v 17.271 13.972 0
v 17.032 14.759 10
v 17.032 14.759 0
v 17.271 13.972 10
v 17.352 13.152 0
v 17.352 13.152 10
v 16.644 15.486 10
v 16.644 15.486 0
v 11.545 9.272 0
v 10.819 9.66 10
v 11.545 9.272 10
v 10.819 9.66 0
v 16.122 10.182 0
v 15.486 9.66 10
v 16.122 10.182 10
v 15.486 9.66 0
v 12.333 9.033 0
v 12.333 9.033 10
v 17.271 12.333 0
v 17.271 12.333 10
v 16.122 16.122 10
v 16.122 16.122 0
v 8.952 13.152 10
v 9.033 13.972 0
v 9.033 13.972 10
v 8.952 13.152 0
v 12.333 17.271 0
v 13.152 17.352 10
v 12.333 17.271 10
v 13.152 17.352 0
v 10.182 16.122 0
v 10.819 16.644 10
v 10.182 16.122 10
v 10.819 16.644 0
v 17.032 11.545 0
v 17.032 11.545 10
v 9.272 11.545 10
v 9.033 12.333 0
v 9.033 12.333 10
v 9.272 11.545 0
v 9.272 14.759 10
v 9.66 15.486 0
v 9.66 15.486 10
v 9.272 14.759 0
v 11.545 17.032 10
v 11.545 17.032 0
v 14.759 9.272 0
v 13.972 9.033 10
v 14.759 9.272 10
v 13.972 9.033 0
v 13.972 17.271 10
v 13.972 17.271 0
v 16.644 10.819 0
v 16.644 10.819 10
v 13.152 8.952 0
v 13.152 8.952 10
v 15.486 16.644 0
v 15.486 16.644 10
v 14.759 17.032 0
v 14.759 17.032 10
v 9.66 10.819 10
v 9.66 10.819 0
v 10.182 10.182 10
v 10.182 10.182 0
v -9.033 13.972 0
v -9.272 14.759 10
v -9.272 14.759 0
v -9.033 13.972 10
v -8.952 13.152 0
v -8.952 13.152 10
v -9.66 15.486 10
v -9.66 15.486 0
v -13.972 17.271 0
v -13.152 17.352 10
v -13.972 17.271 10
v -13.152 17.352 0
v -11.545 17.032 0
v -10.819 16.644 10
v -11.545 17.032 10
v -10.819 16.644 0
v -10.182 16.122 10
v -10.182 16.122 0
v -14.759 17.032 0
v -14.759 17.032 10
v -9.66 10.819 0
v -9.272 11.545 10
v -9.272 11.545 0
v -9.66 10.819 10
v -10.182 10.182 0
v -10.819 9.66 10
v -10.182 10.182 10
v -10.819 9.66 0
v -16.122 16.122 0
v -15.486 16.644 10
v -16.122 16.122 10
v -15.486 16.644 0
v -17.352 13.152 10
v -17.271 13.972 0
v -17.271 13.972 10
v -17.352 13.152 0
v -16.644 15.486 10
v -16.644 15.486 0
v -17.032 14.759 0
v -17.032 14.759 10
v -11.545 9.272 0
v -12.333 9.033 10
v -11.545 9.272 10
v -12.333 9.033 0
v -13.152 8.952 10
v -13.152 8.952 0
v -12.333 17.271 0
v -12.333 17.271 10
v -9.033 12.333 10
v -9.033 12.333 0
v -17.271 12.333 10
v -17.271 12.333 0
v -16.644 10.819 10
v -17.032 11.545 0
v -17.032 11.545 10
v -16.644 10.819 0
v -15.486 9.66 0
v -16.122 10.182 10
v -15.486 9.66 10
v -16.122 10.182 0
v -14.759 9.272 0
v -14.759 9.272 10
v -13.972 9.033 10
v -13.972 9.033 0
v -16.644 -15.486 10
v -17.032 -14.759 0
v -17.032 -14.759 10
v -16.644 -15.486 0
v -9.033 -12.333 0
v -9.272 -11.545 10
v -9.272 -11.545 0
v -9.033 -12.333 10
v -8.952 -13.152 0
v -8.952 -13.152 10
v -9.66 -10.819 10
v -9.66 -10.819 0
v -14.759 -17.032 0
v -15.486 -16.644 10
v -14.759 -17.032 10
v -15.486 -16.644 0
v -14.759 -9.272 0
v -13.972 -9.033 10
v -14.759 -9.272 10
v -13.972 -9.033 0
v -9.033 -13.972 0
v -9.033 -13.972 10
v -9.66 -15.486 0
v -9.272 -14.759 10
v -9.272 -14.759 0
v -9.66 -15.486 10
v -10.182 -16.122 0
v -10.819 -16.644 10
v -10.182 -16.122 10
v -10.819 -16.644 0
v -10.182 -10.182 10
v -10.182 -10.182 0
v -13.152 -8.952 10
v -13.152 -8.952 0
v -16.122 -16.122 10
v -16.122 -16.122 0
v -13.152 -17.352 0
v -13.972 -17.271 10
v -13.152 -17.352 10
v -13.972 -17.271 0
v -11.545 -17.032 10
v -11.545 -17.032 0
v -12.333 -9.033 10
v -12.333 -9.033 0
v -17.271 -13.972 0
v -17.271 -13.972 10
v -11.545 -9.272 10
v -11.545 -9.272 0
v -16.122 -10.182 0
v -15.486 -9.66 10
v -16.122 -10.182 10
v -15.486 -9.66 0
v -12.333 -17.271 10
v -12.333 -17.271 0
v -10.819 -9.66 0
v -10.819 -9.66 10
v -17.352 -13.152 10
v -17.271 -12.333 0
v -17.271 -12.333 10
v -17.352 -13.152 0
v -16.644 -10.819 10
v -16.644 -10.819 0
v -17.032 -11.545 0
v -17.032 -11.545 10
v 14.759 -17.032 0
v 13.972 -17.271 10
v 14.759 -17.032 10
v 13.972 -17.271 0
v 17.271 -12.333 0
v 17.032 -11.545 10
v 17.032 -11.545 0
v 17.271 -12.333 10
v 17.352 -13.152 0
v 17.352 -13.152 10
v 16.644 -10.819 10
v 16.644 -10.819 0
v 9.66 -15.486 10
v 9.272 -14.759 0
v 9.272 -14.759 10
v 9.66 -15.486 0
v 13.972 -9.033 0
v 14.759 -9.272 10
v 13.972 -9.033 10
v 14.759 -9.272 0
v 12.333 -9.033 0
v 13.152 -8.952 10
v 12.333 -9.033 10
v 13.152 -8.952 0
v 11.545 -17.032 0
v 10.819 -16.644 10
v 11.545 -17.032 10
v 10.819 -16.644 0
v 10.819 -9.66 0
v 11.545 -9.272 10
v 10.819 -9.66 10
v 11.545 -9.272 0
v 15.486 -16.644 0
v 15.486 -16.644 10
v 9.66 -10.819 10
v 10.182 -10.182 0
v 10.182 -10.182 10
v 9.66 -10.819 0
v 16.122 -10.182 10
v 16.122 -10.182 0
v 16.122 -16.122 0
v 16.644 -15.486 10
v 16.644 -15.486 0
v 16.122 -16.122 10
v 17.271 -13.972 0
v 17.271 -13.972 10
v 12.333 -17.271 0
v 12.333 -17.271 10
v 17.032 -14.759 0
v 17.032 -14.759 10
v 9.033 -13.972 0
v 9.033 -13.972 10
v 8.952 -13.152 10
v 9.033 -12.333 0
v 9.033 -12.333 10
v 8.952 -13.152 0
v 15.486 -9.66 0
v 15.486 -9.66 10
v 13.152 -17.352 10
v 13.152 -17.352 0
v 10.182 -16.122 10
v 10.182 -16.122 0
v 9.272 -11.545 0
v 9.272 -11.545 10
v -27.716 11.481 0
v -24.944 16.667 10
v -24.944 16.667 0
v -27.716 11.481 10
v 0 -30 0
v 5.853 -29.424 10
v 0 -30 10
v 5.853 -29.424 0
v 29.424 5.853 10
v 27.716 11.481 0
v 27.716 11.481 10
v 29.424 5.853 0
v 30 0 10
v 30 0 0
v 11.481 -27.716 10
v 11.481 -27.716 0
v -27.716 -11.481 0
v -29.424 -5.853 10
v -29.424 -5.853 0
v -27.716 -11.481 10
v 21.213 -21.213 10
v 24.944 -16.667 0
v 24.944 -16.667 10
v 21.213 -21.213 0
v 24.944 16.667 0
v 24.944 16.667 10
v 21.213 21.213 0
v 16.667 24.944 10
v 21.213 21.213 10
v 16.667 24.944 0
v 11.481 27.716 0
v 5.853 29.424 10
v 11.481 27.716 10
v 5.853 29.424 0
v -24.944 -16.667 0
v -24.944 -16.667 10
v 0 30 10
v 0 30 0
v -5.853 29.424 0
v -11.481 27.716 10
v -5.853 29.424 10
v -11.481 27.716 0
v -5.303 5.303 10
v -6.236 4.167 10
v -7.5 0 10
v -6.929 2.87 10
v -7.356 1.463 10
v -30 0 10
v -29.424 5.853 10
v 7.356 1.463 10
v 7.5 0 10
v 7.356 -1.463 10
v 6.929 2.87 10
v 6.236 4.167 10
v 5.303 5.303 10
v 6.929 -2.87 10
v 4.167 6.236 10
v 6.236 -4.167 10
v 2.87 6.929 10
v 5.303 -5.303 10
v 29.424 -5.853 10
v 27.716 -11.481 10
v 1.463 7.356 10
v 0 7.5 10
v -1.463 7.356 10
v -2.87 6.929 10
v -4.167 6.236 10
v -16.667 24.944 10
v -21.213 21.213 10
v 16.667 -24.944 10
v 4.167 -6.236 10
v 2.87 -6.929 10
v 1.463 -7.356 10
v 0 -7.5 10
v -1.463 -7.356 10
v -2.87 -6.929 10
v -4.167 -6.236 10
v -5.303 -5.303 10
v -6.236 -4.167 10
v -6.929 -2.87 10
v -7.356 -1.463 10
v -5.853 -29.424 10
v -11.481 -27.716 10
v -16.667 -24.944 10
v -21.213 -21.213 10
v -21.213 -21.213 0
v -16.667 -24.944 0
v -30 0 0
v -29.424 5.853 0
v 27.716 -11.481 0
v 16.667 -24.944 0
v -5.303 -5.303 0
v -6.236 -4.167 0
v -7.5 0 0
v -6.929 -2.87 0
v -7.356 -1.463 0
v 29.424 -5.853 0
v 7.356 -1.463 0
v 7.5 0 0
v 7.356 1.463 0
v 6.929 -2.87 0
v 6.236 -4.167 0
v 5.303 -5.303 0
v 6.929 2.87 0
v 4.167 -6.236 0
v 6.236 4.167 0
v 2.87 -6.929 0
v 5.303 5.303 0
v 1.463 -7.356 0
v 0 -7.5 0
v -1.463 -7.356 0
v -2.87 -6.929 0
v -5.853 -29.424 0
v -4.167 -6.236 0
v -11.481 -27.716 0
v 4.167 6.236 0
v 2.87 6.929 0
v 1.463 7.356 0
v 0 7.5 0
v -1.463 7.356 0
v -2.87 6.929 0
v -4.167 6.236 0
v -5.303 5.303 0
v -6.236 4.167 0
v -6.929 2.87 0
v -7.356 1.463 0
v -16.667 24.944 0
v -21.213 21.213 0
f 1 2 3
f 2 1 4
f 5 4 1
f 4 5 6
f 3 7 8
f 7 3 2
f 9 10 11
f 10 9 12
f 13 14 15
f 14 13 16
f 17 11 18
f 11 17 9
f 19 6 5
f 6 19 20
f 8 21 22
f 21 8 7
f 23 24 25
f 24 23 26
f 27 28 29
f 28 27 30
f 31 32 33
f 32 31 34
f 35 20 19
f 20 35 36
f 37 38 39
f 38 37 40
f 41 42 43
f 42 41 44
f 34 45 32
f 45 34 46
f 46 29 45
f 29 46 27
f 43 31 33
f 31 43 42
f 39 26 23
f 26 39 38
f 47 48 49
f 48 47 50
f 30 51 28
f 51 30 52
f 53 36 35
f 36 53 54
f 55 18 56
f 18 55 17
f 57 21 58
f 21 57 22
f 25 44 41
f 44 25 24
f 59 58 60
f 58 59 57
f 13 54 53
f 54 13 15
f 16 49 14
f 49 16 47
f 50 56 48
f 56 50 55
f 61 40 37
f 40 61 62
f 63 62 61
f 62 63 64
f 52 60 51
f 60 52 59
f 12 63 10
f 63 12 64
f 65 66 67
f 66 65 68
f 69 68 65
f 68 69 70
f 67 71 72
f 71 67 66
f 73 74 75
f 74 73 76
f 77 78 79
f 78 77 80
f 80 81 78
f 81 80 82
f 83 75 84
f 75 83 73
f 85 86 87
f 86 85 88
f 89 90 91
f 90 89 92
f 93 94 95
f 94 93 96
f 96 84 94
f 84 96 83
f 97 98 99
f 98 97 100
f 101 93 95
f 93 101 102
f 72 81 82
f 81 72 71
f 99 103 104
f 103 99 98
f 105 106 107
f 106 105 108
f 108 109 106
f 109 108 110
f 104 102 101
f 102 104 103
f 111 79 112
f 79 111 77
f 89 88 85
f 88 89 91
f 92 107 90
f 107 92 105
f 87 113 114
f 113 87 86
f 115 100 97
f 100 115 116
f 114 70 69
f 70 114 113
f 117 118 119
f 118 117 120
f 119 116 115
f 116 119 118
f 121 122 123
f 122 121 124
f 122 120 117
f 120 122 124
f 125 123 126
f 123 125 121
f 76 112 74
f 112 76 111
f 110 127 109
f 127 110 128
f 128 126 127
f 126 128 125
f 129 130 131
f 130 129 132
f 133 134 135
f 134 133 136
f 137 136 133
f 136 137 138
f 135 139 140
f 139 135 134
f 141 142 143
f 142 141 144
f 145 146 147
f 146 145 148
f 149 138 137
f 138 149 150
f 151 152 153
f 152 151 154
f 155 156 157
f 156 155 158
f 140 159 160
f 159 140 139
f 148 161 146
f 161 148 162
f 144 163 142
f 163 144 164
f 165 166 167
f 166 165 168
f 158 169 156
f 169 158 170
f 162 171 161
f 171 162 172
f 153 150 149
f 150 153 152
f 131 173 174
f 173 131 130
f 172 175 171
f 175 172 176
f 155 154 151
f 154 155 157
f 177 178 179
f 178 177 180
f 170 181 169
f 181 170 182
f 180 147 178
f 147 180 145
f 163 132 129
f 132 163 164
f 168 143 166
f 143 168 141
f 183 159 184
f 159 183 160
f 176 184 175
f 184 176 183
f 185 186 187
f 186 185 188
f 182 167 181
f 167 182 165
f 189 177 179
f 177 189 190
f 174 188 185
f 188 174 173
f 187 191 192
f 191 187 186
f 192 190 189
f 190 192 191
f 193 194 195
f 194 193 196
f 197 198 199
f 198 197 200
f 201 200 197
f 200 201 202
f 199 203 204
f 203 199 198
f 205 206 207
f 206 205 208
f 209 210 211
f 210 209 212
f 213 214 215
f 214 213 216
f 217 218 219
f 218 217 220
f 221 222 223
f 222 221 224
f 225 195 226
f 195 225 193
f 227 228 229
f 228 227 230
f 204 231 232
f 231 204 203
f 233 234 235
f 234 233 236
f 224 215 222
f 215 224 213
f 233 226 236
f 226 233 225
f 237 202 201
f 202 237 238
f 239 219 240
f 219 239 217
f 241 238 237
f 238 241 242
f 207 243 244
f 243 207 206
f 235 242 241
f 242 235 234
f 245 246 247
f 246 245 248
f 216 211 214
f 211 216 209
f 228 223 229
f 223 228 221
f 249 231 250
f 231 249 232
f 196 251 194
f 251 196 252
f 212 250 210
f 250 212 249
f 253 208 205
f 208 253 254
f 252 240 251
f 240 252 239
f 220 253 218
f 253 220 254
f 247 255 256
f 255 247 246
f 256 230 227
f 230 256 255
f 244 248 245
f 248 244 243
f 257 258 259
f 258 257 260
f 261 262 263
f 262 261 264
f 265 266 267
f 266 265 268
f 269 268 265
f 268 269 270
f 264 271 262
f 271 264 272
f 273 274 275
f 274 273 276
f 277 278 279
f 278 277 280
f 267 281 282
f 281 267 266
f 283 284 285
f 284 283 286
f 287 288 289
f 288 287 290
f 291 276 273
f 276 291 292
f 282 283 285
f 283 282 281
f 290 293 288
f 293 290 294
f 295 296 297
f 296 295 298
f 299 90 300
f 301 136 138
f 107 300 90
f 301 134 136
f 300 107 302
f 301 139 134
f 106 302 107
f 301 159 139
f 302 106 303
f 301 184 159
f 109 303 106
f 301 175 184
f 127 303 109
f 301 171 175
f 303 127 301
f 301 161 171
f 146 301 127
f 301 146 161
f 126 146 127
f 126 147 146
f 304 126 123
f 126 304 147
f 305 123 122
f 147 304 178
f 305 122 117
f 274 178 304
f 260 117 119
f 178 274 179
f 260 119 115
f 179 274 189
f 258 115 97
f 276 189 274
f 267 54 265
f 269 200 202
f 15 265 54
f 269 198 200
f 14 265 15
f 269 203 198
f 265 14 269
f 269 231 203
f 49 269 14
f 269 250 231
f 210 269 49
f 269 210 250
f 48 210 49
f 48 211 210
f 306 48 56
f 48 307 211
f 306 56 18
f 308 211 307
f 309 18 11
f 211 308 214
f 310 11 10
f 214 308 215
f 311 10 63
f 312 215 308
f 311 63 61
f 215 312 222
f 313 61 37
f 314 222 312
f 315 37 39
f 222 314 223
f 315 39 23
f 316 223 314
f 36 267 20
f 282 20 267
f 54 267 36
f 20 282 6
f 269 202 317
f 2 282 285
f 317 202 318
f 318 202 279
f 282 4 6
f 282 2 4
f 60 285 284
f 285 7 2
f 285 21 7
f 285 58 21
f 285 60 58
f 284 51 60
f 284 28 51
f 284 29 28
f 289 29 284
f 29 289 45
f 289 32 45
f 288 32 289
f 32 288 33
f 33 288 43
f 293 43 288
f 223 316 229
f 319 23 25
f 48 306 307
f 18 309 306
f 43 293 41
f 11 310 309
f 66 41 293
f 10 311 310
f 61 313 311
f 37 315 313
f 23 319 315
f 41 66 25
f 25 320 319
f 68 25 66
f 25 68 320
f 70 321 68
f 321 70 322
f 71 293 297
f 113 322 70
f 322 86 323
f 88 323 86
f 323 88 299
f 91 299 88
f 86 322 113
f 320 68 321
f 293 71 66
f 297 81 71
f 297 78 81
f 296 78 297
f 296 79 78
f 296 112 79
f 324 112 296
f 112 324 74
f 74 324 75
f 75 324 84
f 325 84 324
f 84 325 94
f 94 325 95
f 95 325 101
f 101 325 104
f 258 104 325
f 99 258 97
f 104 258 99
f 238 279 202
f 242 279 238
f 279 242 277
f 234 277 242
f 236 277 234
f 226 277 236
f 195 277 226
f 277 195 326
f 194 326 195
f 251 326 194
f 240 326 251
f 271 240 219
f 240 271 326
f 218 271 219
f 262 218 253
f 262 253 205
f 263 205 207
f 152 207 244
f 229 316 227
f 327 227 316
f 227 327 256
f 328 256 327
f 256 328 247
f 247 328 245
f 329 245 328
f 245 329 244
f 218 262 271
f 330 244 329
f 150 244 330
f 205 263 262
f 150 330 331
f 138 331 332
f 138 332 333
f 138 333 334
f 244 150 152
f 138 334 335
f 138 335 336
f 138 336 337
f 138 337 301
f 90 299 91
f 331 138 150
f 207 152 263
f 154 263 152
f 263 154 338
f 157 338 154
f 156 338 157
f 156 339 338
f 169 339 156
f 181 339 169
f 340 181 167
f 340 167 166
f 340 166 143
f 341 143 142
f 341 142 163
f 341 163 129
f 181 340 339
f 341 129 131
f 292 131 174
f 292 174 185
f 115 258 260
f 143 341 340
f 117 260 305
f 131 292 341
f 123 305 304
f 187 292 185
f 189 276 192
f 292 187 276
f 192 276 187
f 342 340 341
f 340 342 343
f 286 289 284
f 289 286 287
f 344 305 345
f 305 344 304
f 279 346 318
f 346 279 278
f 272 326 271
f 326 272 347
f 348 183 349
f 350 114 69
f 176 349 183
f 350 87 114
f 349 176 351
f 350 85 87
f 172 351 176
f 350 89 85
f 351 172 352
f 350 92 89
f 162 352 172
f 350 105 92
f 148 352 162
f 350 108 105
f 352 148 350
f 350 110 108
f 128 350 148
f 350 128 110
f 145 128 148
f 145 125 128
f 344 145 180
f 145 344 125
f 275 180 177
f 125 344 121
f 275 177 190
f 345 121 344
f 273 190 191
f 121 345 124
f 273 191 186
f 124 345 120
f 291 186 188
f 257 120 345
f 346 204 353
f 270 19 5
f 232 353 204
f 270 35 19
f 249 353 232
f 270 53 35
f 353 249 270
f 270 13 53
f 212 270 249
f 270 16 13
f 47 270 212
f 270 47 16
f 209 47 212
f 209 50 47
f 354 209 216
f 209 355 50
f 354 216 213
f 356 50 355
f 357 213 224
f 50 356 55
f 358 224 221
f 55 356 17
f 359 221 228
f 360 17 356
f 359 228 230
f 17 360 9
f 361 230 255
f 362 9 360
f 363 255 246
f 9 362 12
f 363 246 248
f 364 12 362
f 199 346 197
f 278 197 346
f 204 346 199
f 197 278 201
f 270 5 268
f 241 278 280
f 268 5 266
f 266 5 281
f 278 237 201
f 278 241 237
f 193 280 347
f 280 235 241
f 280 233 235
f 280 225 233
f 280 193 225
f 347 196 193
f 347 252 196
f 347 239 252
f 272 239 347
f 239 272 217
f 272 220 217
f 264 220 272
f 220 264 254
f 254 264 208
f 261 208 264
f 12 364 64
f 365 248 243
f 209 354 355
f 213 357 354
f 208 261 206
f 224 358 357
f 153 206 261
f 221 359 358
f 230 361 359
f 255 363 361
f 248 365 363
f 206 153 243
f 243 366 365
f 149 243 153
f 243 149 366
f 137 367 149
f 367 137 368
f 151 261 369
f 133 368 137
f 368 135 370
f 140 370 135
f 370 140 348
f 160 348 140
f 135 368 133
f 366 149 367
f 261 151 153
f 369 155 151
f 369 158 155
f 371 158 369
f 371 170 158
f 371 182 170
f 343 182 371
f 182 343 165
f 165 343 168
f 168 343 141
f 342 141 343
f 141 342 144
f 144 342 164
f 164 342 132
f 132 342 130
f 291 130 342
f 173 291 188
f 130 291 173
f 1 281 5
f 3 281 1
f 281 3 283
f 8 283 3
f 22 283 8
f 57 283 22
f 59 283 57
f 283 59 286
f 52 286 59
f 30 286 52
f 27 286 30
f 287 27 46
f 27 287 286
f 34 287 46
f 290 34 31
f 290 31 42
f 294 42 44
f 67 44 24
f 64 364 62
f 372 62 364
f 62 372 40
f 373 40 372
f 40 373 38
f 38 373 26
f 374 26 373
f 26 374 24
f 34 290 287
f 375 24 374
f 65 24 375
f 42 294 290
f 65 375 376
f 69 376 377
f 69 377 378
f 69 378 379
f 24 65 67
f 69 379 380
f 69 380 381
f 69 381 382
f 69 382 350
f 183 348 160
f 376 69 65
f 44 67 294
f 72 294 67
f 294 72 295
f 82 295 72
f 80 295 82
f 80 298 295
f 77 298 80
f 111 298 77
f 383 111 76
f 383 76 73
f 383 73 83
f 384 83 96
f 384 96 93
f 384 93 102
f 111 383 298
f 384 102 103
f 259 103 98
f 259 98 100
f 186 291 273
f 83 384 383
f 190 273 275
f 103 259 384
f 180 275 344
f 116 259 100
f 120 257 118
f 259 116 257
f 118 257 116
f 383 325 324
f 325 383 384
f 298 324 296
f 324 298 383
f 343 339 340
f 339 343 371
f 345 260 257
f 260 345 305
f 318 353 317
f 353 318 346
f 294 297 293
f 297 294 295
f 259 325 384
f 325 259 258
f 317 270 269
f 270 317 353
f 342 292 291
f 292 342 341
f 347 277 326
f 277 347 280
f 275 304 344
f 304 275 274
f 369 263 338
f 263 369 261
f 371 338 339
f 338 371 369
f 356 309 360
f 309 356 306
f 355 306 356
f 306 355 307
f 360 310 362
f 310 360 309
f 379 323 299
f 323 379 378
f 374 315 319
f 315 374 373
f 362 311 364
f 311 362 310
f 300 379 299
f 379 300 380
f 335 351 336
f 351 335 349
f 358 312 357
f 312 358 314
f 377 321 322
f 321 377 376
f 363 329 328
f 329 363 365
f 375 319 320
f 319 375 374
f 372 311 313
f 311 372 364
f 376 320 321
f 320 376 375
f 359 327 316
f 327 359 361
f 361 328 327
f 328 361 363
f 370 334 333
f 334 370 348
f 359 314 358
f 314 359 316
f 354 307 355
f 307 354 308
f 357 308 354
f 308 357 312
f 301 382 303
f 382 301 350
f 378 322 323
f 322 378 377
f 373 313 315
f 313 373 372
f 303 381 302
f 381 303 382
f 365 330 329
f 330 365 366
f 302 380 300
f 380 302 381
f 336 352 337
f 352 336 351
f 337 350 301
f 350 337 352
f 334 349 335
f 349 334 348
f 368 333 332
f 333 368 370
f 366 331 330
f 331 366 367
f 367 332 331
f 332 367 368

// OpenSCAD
$fn = 32;

// ----------------------------------------------------------------------
// Flange Ø60 x 10
// 4 holes on a Ø37.2 bolt circle, bolted joints
// ----------------------------------------------------------------------

// --- parameters (mm) ---
flange_d = 60;   // outside diameter of the flange
thickness = 10;  // flange thickness
holes = 4;       // number of bolt holes
pcd = 37.2;      // bolt circle diameter
start_deg = 45;  // angle of the first hole, from +X
hole_d = 8.4;    // bolt hole diameter
bore_d = 15;     // central through bore
hub_d = 27;      // hub outside diameter
hub_h = 0;       // hub height above the flange face (0 = no hub)

// --- derived feature positions (mm) ---
height = thickness + hub_h;  // = 10   overall height of the part
pcd_r = pcd / 2;             // = 18.6   bolt circle radius
hole_step = 360 / holes;     // = 90   angular pitch
feature_centers = [
  [pcd_r * cos(start_deg + 0 * hole_step), pcd_r * sin(start_deg + 0 * hole_step)],
  [pcd_r * cos(start_deg + 1 * hole_step), pcd_r * sin(start_deg + 1 * hole_step)],
  [pcd_r * cos(start_deg + 2 * hole_step), pcd_r * sin(start_deg + 2 * hole_step)],
  [pcd_r * cos(start_deg + 3 * hole_step), pcd_r * sin(start_deg + 3 * hole_step)]
];   // bolt hole centres on the pitch circle

// flange disc, every hole and the bore cut straight through
difference() {
  union() {
    cylinder(d = flange_d, h = thickness);
  }
  translate([0, 0, -1]) cylinder(d = bore_d, h = height + 2);  // bore, through
  for (centre = feature_centers)
    translate([centre[0], centre[1], -1]) cylinder(d = hole_d, h = thickness + 2);
}
